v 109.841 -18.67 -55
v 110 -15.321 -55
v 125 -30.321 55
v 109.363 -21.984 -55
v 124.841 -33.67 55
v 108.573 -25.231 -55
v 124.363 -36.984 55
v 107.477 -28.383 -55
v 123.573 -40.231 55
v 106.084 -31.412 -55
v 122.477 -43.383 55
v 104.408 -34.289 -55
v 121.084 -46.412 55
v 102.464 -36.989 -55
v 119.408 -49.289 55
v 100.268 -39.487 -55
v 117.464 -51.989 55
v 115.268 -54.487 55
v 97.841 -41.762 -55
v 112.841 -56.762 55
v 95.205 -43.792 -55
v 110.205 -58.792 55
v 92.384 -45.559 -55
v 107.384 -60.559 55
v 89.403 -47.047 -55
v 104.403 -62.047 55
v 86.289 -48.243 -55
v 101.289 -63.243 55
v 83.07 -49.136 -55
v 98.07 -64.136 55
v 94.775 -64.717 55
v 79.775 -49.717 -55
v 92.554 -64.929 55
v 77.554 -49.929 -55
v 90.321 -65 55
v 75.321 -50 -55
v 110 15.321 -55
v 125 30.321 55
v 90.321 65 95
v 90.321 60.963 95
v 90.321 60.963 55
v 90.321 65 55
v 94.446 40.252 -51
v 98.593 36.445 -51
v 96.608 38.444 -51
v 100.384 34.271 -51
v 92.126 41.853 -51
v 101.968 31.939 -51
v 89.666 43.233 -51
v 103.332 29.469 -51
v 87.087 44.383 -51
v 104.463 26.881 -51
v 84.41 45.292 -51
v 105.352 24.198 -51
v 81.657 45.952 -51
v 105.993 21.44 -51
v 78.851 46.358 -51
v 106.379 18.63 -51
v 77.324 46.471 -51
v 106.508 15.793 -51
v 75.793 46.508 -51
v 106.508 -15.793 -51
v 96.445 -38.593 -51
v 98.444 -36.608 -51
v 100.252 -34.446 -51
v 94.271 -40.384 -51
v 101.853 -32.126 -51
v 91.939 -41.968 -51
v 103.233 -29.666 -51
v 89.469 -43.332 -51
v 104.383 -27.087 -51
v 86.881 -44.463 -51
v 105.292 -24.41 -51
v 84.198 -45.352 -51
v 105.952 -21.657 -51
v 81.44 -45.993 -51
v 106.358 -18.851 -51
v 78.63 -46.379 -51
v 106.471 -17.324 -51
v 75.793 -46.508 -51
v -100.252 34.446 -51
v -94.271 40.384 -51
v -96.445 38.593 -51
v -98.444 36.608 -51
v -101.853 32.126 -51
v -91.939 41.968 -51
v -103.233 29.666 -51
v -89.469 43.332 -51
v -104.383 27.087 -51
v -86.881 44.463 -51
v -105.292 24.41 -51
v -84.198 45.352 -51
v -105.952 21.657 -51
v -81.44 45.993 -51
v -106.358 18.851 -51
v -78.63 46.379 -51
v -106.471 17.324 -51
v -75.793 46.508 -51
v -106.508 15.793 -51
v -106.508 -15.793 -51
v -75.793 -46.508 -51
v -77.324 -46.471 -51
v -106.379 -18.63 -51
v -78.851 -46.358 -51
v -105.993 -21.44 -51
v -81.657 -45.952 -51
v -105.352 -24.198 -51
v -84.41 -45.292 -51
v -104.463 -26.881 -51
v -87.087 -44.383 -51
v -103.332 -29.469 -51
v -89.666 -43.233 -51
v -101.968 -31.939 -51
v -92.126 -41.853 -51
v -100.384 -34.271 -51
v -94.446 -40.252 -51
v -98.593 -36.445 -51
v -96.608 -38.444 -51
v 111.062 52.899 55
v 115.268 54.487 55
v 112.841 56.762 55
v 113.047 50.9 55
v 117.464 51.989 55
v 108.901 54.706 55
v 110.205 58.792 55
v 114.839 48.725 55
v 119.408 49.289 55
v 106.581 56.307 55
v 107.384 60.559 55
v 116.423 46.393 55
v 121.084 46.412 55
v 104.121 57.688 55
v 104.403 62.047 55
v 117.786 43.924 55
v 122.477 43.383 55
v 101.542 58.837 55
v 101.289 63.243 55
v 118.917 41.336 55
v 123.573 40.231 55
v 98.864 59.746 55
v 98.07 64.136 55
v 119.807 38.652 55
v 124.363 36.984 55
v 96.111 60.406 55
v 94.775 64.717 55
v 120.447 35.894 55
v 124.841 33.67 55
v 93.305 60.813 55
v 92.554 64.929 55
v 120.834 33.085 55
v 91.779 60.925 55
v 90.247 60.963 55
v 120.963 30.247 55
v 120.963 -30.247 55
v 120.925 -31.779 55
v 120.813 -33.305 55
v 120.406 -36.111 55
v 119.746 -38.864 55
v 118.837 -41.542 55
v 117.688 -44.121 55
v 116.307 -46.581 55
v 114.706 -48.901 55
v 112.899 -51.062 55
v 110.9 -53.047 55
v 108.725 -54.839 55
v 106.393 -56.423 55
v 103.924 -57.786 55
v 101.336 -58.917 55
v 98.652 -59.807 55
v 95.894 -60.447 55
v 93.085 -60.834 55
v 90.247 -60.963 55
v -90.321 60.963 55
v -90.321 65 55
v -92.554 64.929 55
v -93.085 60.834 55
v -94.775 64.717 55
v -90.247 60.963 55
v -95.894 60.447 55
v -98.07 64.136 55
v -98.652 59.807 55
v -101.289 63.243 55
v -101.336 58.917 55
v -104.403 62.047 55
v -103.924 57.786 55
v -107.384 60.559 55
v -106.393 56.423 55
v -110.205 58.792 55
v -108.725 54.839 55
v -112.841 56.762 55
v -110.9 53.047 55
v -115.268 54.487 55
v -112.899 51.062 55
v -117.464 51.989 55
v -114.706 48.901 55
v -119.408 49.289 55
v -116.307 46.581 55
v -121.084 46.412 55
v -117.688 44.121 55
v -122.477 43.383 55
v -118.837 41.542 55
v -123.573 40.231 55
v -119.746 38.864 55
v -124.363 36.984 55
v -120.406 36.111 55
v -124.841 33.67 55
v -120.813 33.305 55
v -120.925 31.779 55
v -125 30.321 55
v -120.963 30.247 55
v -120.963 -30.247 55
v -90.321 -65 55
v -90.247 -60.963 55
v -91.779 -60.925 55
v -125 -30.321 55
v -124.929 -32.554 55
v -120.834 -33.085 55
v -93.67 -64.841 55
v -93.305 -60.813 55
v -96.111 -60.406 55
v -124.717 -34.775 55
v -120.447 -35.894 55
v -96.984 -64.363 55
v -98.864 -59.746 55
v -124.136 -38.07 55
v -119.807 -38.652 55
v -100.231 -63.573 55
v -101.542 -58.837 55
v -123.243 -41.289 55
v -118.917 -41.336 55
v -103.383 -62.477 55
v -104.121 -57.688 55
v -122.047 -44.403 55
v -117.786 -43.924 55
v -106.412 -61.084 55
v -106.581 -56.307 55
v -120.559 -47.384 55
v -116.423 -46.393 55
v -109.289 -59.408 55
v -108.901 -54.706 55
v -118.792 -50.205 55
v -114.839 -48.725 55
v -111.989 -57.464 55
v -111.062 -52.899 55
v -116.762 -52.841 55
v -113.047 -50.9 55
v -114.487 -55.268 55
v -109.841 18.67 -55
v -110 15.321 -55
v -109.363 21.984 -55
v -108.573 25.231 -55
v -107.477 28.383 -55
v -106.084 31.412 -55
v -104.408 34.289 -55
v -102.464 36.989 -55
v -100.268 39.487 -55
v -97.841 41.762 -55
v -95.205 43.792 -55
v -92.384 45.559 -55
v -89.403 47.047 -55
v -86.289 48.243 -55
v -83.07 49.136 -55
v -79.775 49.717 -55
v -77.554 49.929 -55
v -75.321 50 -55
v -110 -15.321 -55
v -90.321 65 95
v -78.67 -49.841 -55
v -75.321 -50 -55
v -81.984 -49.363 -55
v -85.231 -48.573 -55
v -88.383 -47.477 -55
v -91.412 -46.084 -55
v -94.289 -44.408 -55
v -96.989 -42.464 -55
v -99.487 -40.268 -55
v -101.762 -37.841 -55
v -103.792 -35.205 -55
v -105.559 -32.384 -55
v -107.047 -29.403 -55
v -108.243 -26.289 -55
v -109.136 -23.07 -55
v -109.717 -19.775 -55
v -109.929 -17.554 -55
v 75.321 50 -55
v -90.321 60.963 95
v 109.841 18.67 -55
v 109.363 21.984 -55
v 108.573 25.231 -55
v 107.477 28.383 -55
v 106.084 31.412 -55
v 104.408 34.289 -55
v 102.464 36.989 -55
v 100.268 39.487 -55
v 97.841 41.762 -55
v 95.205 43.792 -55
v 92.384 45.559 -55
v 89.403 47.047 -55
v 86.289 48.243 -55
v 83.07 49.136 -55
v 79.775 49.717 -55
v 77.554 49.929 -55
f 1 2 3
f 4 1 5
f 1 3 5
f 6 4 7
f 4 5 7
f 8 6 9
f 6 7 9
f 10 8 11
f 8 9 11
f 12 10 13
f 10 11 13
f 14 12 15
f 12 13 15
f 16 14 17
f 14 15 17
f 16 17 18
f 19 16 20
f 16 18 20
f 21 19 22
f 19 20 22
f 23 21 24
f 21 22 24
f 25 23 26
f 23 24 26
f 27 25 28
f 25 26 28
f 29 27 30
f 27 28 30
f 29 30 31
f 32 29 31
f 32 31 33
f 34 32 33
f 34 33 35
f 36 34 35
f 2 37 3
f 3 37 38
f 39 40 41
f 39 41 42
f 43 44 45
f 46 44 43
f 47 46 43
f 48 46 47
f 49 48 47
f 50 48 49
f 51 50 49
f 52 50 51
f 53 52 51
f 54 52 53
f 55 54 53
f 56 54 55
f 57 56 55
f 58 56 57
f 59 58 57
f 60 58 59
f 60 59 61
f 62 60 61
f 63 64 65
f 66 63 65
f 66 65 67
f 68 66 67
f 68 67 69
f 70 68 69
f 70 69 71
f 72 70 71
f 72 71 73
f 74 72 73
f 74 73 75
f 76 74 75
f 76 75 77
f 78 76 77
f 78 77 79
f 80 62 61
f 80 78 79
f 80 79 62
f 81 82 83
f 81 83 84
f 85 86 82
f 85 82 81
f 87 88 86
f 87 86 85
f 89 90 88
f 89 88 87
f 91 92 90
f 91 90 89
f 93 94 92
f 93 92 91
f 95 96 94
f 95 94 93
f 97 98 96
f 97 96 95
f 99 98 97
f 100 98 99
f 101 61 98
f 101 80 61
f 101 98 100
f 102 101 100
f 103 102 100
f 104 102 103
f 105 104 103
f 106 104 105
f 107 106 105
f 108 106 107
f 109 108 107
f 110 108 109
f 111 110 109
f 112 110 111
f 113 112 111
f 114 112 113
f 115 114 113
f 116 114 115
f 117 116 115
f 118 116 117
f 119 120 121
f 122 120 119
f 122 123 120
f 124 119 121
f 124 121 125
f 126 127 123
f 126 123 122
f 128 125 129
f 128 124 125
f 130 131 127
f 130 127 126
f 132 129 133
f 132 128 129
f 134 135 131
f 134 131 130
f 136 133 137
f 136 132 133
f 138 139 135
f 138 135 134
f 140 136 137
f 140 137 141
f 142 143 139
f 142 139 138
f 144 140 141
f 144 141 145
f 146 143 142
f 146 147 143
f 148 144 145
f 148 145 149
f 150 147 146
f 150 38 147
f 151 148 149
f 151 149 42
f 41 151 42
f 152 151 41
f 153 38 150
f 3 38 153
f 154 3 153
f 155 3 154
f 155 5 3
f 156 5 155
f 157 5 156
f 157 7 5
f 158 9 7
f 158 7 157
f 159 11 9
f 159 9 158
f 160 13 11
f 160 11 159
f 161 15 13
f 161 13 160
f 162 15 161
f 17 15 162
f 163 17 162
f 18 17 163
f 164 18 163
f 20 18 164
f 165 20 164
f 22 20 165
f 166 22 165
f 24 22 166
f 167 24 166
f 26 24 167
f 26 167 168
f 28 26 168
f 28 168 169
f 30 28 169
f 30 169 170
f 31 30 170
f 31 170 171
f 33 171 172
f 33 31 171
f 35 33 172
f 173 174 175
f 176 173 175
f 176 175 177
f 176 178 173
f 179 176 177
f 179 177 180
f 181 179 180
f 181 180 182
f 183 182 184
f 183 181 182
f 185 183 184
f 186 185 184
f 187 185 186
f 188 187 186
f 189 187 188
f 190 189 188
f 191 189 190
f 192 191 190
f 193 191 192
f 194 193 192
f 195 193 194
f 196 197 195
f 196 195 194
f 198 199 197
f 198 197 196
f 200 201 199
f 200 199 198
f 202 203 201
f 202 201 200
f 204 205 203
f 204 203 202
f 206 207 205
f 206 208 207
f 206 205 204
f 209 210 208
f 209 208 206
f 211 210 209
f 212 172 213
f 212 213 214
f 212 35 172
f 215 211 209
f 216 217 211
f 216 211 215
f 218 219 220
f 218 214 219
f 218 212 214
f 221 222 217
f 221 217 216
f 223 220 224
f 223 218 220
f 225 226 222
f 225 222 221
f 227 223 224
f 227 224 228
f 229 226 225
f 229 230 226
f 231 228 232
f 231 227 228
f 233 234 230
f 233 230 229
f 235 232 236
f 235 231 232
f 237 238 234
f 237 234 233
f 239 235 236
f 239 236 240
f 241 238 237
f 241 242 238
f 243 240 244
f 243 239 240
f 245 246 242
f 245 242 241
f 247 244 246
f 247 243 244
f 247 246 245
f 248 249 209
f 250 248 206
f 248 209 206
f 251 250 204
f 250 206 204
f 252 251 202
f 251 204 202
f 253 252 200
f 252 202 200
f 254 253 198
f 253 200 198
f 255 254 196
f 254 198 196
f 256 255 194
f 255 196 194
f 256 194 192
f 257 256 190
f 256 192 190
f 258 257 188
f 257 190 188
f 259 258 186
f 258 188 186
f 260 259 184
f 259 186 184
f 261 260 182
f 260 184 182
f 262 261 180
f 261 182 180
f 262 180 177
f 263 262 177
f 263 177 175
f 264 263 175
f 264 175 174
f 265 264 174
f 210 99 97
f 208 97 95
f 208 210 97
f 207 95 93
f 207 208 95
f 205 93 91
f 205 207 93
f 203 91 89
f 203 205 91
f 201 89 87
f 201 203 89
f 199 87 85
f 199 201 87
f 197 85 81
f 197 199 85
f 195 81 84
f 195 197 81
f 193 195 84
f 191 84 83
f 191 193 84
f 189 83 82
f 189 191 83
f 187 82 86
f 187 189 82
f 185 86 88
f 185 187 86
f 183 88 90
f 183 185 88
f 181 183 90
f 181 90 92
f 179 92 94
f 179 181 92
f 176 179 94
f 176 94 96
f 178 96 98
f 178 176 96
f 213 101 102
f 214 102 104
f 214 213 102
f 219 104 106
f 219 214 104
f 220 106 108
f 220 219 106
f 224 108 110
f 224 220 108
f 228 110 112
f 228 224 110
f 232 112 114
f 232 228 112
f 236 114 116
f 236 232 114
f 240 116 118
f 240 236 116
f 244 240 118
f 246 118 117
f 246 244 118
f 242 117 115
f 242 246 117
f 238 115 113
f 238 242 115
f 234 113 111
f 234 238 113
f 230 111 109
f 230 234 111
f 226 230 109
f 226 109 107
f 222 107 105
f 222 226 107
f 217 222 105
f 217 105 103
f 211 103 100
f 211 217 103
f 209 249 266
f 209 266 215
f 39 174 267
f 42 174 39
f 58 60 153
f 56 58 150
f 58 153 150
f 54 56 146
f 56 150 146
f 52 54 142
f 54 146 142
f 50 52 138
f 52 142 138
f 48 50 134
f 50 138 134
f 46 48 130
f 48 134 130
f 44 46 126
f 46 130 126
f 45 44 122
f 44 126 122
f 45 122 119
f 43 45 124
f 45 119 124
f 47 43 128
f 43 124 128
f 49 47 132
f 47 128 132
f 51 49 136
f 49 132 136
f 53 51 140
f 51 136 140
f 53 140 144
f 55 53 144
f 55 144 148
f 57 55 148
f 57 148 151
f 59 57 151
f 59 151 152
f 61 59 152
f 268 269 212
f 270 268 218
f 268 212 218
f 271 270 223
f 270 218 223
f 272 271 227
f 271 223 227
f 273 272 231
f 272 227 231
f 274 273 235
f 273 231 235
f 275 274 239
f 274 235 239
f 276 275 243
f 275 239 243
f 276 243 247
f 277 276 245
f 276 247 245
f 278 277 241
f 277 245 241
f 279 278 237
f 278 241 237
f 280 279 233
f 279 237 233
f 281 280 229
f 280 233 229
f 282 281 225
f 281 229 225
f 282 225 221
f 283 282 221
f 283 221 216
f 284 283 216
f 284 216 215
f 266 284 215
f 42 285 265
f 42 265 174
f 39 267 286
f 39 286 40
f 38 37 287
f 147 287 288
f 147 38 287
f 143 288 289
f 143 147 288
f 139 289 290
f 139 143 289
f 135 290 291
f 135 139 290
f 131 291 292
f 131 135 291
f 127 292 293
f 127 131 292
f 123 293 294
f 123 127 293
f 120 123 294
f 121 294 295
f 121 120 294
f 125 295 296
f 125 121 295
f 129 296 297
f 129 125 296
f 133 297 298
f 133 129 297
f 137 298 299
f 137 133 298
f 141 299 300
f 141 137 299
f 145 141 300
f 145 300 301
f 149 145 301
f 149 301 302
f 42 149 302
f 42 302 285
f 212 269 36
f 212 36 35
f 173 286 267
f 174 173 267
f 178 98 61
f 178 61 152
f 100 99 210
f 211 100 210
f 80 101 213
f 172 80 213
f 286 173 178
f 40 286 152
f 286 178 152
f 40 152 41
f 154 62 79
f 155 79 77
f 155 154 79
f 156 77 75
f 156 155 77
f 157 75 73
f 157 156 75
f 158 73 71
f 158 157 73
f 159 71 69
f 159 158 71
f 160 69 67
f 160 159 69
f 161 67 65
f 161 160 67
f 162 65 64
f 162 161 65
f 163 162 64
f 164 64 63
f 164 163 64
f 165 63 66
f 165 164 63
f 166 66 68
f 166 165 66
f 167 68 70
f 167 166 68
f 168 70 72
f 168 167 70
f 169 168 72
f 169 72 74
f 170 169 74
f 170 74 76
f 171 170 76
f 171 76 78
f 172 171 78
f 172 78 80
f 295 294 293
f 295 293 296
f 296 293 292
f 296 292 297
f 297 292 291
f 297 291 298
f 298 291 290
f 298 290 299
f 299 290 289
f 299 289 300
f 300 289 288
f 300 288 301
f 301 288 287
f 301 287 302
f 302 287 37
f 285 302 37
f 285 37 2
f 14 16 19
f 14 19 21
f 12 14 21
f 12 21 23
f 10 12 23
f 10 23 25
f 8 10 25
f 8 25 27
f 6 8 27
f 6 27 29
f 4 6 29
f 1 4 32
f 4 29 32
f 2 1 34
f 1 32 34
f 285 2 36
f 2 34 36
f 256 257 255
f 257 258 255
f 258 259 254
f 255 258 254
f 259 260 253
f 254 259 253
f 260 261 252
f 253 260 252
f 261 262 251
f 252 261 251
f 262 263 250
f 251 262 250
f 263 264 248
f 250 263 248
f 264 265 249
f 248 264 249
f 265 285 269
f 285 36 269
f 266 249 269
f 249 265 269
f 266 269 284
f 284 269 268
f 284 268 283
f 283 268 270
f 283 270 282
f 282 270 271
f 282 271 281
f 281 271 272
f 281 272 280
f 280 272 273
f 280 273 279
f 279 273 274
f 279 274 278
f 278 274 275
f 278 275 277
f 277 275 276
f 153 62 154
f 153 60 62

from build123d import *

# Parameters (mm, degrees)
F0_W      = 125
F0_H      = 110
F1_DEPTH  = 65
F3_DEPTH  = 65.001
F5_DEPTH  = 125.001
F8_R      = 35
F9_T      = -4
F10_W     = 180.6418882369
F10_H     = 4.0370187838
F11_DEPTH = 40


with BuildPart() as f1:
    # F0 (on Front) → F1 (new body)
    with BuildSketch(Plane.XZ):
        with Locations((-62.5, 0)):
            Rectangle(F0_W, F0_H)
    extrude(amount=F1_DEPTH)

    # F2 (on face) → F3 (cut, through all)
    with BuildSketch(Plane.XZ.offset(65)):
        Polygon((-110, -55), (-125, 55), (-154.2346477509, 55), (-148.0445983784, -67.179696599), (-108.0001720049, -65.150906356), align=None)
    extrude(amount=-F3_DEPTH, mode=Mode.SUBTRACT)

    # F4 (on face) → F5 (cut, through all)
    with BuildSketch(Plane.YZ):
        Polygon((-50, -55), (-65, 55), (-101.2629643083, 55), (-94.3923816085, -57.4389097095), (-50, -57.4389097095), align=None)
    extrude(amount=-F5_DEPTH, mode=Mode.SUBTRACT)

    # F6: F1 across face


with BuildPart() as f1_1:
    add(f1.part)
    add(f1.part.mirror(Plane(origin=(0, -28.9130434783, 2.3913043478), x_dir=(0, 1, 0), z_dir=(1, 0, 0))))

    # F7: F1 across face


with BuildPart() as f1_2:
    add(f1_1.part)
    add(f1_1.part.mirror(Plane(origin=(0, 0, 1.170212766), x_dir=(-1, 0, 0), z_dir=(0, 1, 0))))

    # F8
    f8_edges = [f1_2.edges().sort_by_distance(p)[0] for p in [
        (-117.5, -57.5, 0),
        (-117.5, 57.5, 0),
        (117.5, -57.5, 0),
        (117.5, 57.5, 0),
    ]]
    fillet(f8_edges, radius=F8_R)

    # F9
    f9_openings = [f1_2.faces().sort_by_distance(p)[0] for p in [
        (0, 0, 55),
    ]]
    offset(amount=F9_T, openings=f9_openings)

    # F10 (on face) → F11 (join)
    with BuildSketch(Plane.XY.offset(55)):
        with Locations((0, 62.9814906081)):
            Rectangle(F10_W, F10_H)
    extrude(amount=F11_DEPTH)


solid = f1_2.part
